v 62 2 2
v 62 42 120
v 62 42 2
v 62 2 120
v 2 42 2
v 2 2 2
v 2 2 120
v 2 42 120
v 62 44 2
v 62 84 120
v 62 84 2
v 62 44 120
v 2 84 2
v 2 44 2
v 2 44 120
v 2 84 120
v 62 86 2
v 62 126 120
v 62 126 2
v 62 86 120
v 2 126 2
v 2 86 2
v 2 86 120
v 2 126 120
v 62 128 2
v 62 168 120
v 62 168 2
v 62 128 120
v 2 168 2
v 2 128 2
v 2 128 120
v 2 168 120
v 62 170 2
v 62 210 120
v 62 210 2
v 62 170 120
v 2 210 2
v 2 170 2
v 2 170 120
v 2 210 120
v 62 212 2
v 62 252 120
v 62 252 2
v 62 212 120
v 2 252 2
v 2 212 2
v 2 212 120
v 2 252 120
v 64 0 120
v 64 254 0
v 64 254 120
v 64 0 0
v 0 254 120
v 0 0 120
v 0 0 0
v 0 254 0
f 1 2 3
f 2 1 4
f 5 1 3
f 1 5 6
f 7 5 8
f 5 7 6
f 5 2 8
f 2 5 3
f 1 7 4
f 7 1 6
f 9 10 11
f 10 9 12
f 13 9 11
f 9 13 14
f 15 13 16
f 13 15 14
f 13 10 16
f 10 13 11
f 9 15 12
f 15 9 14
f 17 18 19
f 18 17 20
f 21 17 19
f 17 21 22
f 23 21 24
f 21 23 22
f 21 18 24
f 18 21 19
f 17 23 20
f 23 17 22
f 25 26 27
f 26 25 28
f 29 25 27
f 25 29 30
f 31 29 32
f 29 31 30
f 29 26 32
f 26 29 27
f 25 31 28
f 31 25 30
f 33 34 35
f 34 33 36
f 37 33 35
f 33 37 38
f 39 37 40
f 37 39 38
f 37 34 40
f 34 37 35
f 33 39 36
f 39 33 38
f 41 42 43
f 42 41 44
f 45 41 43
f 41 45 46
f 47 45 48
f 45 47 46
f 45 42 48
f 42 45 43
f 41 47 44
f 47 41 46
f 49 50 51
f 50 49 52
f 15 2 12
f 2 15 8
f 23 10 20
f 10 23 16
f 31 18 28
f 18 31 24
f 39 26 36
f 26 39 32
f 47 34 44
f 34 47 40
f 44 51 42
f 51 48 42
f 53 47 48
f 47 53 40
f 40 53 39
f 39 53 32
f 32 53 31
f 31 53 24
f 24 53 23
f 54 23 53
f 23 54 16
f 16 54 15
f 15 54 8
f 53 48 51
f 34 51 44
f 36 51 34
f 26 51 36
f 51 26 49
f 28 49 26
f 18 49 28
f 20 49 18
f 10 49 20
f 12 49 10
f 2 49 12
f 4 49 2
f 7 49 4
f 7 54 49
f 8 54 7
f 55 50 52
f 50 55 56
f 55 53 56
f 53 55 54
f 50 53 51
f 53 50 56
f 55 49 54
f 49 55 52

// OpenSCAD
count = 6;

l=60;
p=40;

wall=2;

difference() {
	cube([l+wall*2,p*count+wall*count+wall,120]);
	for (y=[0:count-1]) 
		translate([wall, wall+wall*y+ p*y, wall])
			cube([l,p,120]);
	
}
